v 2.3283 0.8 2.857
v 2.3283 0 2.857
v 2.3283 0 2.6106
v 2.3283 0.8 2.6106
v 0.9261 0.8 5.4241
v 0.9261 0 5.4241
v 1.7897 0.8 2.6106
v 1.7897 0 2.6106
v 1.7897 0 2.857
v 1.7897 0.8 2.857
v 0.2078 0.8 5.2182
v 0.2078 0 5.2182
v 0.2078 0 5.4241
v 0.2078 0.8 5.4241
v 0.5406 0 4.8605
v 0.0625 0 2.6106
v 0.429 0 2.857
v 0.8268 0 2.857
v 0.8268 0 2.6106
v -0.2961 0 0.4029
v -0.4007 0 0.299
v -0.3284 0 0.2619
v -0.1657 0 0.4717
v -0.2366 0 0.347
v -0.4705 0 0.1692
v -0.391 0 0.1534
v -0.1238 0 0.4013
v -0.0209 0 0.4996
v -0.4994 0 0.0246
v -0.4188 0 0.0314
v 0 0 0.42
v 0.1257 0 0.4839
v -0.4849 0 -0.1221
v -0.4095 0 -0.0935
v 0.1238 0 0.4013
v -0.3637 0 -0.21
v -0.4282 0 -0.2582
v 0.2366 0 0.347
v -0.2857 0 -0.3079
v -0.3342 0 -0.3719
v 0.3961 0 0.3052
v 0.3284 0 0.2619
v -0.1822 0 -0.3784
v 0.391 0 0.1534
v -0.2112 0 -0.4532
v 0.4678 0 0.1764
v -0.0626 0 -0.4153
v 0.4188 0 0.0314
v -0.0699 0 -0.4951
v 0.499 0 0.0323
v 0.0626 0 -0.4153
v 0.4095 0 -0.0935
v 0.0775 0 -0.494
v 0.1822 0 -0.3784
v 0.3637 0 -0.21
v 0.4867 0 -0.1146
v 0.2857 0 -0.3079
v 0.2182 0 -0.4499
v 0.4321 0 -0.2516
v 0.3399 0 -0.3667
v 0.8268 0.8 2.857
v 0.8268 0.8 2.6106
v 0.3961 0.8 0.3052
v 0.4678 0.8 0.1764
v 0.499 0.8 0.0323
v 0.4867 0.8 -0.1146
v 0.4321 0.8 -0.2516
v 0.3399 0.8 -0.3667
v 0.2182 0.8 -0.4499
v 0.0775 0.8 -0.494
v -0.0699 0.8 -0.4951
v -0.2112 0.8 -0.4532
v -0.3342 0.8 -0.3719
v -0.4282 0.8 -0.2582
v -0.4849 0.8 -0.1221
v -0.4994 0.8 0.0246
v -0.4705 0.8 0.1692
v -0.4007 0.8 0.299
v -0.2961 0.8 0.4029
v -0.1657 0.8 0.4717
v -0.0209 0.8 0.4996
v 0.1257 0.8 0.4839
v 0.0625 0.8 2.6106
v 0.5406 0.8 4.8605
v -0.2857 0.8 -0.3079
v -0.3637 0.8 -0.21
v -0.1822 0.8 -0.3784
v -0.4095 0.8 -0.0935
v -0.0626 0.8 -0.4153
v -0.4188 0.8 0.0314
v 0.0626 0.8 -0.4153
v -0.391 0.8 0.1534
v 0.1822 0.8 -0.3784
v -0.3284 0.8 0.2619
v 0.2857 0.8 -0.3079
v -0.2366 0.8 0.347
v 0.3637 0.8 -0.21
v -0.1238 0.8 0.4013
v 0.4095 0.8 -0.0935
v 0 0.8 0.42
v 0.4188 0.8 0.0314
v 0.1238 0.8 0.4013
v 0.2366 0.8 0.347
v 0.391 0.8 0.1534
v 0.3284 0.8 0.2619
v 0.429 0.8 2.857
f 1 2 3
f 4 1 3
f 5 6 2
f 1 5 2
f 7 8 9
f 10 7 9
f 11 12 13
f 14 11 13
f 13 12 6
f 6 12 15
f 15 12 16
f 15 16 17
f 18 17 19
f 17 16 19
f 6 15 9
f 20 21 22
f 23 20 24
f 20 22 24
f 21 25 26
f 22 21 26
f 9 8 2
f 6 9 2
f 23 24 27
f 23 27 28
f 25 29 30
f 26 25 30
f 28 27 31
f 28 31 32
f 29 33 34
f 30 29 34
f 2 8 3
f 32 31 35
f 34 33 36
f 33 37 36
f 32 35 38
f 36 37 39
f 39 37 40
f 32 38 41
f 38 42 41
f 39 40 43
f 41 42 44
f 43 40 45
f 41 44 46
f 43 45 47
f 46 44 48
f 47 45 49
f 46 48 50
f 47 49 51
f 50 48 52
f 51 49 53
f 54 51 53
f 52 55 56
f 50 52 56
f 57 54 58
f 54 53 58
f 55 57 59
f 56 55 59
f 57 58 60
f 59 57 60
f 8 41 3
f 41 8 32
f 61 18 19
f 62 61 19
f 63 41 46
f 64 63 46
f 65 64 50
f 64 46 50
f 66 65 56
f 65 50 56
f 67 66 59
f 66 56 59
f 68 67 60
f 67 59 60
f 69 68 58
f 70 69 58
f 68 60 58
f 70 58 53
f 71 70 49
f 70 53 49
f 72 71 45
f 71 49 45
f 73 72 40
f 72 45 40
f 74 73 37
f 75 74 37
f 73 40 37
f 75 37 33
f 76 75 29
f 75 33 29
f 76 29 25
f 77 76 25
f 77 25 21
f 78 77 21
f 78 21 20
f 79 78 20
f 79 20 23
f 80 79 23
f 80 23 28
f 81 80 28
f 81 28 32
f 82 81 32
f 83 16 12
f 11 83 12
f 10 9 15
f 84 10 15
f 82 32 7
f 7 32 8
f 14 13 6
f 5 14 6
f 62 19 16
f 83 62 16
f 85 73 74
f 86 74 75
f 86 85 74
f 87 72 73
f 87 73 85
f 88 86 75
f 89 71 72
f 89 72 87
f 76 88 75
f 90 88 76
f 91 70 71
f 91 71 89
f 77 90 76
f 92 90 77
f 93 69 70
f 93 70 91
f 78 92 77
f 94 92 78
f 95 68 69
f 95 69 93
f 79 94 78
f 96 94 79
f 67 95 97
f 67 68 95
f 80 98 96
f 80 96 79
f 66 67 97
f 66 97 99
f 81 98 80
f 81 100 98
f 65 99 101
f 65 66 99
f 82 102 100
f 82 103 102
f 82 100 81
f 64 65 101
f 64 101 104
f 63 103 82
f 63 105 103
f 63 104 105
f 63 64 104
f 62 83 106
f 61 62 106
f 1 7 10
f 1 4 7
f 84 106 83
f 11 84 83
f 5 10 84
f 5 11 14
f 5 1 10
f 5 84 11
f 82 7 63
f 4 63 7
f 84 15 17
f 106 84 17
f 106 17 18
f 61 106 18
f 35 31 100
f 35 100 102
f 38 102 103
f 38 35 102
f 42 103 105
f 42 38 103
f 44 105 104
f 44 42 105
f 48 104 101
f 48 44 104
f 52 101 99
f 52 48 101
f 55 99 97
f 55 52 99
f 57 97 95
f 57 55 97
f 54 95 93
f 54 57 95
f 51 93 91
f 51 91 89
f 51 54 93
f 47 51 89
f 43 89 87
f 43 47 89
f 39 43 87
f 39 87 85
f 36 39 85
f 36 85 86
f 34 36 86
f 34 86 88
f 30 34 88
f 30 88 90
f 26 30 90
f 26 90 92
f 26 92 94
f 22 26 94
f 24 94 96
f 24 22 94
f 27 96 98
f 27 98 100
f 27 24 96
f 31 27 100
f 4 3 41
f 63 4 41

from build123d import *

# Parameters (mm, degrees)
SKETCH1_R           = 0.5
SKETCH1_R_2         = 0.42
BOSS_EXTRUDE1_DEPTH = 0.8
BOSS_EXTRUDE2_DEPTH = 0.8


with BuildPart() as part:
    # Sketch1 → Boss-Extrude1 (new body)
    with BuildSketch(Plane(origin=(0, 0, 0), x_dir=(1, 0, 0), z_dir=(0, 1, 0))):
        with Locations(Location((0, 0, 0), (0, 0, 270))):
            Circle(SKETCH1_R)
        with Locations(Location((0, 0, 0), (0, 0, 270))):
            Circle(SKETCH1_R_2, mode=Mode.SUBTRACT)
    extrude(amount=BOSS_EXTRUDE1_DEPTH)

    # Sketch2 → Boss-Extrude2 (add)
    with BuildSketch(Plane(origin=(0, 0, 0), x_dir=(1, 0, 0), z_dir=(0, 1, 0))):
        Polygon((0.108286112, -0.461724255), (1.789664547, -2.610569743), (1.789664547, -2.857049284), (0.540630382, -4.860515333), (0.428982179, -2.857049284), (0.826811996, -2.857049284), (0.826811996, -2.610569743), (0.062491975, -2.610569743), (0.207810173, -5.218225459), (0.207810173, -5.424104553), (0.926078261, -5.424104553), (2.328298725, -2.857049284), (2.328298725, -2.610569743), (0.39605028, -0.305195308), align=None)
    extrude(amount=BOSS_EXTRUDE2_DEPTH)


solid = part.part
